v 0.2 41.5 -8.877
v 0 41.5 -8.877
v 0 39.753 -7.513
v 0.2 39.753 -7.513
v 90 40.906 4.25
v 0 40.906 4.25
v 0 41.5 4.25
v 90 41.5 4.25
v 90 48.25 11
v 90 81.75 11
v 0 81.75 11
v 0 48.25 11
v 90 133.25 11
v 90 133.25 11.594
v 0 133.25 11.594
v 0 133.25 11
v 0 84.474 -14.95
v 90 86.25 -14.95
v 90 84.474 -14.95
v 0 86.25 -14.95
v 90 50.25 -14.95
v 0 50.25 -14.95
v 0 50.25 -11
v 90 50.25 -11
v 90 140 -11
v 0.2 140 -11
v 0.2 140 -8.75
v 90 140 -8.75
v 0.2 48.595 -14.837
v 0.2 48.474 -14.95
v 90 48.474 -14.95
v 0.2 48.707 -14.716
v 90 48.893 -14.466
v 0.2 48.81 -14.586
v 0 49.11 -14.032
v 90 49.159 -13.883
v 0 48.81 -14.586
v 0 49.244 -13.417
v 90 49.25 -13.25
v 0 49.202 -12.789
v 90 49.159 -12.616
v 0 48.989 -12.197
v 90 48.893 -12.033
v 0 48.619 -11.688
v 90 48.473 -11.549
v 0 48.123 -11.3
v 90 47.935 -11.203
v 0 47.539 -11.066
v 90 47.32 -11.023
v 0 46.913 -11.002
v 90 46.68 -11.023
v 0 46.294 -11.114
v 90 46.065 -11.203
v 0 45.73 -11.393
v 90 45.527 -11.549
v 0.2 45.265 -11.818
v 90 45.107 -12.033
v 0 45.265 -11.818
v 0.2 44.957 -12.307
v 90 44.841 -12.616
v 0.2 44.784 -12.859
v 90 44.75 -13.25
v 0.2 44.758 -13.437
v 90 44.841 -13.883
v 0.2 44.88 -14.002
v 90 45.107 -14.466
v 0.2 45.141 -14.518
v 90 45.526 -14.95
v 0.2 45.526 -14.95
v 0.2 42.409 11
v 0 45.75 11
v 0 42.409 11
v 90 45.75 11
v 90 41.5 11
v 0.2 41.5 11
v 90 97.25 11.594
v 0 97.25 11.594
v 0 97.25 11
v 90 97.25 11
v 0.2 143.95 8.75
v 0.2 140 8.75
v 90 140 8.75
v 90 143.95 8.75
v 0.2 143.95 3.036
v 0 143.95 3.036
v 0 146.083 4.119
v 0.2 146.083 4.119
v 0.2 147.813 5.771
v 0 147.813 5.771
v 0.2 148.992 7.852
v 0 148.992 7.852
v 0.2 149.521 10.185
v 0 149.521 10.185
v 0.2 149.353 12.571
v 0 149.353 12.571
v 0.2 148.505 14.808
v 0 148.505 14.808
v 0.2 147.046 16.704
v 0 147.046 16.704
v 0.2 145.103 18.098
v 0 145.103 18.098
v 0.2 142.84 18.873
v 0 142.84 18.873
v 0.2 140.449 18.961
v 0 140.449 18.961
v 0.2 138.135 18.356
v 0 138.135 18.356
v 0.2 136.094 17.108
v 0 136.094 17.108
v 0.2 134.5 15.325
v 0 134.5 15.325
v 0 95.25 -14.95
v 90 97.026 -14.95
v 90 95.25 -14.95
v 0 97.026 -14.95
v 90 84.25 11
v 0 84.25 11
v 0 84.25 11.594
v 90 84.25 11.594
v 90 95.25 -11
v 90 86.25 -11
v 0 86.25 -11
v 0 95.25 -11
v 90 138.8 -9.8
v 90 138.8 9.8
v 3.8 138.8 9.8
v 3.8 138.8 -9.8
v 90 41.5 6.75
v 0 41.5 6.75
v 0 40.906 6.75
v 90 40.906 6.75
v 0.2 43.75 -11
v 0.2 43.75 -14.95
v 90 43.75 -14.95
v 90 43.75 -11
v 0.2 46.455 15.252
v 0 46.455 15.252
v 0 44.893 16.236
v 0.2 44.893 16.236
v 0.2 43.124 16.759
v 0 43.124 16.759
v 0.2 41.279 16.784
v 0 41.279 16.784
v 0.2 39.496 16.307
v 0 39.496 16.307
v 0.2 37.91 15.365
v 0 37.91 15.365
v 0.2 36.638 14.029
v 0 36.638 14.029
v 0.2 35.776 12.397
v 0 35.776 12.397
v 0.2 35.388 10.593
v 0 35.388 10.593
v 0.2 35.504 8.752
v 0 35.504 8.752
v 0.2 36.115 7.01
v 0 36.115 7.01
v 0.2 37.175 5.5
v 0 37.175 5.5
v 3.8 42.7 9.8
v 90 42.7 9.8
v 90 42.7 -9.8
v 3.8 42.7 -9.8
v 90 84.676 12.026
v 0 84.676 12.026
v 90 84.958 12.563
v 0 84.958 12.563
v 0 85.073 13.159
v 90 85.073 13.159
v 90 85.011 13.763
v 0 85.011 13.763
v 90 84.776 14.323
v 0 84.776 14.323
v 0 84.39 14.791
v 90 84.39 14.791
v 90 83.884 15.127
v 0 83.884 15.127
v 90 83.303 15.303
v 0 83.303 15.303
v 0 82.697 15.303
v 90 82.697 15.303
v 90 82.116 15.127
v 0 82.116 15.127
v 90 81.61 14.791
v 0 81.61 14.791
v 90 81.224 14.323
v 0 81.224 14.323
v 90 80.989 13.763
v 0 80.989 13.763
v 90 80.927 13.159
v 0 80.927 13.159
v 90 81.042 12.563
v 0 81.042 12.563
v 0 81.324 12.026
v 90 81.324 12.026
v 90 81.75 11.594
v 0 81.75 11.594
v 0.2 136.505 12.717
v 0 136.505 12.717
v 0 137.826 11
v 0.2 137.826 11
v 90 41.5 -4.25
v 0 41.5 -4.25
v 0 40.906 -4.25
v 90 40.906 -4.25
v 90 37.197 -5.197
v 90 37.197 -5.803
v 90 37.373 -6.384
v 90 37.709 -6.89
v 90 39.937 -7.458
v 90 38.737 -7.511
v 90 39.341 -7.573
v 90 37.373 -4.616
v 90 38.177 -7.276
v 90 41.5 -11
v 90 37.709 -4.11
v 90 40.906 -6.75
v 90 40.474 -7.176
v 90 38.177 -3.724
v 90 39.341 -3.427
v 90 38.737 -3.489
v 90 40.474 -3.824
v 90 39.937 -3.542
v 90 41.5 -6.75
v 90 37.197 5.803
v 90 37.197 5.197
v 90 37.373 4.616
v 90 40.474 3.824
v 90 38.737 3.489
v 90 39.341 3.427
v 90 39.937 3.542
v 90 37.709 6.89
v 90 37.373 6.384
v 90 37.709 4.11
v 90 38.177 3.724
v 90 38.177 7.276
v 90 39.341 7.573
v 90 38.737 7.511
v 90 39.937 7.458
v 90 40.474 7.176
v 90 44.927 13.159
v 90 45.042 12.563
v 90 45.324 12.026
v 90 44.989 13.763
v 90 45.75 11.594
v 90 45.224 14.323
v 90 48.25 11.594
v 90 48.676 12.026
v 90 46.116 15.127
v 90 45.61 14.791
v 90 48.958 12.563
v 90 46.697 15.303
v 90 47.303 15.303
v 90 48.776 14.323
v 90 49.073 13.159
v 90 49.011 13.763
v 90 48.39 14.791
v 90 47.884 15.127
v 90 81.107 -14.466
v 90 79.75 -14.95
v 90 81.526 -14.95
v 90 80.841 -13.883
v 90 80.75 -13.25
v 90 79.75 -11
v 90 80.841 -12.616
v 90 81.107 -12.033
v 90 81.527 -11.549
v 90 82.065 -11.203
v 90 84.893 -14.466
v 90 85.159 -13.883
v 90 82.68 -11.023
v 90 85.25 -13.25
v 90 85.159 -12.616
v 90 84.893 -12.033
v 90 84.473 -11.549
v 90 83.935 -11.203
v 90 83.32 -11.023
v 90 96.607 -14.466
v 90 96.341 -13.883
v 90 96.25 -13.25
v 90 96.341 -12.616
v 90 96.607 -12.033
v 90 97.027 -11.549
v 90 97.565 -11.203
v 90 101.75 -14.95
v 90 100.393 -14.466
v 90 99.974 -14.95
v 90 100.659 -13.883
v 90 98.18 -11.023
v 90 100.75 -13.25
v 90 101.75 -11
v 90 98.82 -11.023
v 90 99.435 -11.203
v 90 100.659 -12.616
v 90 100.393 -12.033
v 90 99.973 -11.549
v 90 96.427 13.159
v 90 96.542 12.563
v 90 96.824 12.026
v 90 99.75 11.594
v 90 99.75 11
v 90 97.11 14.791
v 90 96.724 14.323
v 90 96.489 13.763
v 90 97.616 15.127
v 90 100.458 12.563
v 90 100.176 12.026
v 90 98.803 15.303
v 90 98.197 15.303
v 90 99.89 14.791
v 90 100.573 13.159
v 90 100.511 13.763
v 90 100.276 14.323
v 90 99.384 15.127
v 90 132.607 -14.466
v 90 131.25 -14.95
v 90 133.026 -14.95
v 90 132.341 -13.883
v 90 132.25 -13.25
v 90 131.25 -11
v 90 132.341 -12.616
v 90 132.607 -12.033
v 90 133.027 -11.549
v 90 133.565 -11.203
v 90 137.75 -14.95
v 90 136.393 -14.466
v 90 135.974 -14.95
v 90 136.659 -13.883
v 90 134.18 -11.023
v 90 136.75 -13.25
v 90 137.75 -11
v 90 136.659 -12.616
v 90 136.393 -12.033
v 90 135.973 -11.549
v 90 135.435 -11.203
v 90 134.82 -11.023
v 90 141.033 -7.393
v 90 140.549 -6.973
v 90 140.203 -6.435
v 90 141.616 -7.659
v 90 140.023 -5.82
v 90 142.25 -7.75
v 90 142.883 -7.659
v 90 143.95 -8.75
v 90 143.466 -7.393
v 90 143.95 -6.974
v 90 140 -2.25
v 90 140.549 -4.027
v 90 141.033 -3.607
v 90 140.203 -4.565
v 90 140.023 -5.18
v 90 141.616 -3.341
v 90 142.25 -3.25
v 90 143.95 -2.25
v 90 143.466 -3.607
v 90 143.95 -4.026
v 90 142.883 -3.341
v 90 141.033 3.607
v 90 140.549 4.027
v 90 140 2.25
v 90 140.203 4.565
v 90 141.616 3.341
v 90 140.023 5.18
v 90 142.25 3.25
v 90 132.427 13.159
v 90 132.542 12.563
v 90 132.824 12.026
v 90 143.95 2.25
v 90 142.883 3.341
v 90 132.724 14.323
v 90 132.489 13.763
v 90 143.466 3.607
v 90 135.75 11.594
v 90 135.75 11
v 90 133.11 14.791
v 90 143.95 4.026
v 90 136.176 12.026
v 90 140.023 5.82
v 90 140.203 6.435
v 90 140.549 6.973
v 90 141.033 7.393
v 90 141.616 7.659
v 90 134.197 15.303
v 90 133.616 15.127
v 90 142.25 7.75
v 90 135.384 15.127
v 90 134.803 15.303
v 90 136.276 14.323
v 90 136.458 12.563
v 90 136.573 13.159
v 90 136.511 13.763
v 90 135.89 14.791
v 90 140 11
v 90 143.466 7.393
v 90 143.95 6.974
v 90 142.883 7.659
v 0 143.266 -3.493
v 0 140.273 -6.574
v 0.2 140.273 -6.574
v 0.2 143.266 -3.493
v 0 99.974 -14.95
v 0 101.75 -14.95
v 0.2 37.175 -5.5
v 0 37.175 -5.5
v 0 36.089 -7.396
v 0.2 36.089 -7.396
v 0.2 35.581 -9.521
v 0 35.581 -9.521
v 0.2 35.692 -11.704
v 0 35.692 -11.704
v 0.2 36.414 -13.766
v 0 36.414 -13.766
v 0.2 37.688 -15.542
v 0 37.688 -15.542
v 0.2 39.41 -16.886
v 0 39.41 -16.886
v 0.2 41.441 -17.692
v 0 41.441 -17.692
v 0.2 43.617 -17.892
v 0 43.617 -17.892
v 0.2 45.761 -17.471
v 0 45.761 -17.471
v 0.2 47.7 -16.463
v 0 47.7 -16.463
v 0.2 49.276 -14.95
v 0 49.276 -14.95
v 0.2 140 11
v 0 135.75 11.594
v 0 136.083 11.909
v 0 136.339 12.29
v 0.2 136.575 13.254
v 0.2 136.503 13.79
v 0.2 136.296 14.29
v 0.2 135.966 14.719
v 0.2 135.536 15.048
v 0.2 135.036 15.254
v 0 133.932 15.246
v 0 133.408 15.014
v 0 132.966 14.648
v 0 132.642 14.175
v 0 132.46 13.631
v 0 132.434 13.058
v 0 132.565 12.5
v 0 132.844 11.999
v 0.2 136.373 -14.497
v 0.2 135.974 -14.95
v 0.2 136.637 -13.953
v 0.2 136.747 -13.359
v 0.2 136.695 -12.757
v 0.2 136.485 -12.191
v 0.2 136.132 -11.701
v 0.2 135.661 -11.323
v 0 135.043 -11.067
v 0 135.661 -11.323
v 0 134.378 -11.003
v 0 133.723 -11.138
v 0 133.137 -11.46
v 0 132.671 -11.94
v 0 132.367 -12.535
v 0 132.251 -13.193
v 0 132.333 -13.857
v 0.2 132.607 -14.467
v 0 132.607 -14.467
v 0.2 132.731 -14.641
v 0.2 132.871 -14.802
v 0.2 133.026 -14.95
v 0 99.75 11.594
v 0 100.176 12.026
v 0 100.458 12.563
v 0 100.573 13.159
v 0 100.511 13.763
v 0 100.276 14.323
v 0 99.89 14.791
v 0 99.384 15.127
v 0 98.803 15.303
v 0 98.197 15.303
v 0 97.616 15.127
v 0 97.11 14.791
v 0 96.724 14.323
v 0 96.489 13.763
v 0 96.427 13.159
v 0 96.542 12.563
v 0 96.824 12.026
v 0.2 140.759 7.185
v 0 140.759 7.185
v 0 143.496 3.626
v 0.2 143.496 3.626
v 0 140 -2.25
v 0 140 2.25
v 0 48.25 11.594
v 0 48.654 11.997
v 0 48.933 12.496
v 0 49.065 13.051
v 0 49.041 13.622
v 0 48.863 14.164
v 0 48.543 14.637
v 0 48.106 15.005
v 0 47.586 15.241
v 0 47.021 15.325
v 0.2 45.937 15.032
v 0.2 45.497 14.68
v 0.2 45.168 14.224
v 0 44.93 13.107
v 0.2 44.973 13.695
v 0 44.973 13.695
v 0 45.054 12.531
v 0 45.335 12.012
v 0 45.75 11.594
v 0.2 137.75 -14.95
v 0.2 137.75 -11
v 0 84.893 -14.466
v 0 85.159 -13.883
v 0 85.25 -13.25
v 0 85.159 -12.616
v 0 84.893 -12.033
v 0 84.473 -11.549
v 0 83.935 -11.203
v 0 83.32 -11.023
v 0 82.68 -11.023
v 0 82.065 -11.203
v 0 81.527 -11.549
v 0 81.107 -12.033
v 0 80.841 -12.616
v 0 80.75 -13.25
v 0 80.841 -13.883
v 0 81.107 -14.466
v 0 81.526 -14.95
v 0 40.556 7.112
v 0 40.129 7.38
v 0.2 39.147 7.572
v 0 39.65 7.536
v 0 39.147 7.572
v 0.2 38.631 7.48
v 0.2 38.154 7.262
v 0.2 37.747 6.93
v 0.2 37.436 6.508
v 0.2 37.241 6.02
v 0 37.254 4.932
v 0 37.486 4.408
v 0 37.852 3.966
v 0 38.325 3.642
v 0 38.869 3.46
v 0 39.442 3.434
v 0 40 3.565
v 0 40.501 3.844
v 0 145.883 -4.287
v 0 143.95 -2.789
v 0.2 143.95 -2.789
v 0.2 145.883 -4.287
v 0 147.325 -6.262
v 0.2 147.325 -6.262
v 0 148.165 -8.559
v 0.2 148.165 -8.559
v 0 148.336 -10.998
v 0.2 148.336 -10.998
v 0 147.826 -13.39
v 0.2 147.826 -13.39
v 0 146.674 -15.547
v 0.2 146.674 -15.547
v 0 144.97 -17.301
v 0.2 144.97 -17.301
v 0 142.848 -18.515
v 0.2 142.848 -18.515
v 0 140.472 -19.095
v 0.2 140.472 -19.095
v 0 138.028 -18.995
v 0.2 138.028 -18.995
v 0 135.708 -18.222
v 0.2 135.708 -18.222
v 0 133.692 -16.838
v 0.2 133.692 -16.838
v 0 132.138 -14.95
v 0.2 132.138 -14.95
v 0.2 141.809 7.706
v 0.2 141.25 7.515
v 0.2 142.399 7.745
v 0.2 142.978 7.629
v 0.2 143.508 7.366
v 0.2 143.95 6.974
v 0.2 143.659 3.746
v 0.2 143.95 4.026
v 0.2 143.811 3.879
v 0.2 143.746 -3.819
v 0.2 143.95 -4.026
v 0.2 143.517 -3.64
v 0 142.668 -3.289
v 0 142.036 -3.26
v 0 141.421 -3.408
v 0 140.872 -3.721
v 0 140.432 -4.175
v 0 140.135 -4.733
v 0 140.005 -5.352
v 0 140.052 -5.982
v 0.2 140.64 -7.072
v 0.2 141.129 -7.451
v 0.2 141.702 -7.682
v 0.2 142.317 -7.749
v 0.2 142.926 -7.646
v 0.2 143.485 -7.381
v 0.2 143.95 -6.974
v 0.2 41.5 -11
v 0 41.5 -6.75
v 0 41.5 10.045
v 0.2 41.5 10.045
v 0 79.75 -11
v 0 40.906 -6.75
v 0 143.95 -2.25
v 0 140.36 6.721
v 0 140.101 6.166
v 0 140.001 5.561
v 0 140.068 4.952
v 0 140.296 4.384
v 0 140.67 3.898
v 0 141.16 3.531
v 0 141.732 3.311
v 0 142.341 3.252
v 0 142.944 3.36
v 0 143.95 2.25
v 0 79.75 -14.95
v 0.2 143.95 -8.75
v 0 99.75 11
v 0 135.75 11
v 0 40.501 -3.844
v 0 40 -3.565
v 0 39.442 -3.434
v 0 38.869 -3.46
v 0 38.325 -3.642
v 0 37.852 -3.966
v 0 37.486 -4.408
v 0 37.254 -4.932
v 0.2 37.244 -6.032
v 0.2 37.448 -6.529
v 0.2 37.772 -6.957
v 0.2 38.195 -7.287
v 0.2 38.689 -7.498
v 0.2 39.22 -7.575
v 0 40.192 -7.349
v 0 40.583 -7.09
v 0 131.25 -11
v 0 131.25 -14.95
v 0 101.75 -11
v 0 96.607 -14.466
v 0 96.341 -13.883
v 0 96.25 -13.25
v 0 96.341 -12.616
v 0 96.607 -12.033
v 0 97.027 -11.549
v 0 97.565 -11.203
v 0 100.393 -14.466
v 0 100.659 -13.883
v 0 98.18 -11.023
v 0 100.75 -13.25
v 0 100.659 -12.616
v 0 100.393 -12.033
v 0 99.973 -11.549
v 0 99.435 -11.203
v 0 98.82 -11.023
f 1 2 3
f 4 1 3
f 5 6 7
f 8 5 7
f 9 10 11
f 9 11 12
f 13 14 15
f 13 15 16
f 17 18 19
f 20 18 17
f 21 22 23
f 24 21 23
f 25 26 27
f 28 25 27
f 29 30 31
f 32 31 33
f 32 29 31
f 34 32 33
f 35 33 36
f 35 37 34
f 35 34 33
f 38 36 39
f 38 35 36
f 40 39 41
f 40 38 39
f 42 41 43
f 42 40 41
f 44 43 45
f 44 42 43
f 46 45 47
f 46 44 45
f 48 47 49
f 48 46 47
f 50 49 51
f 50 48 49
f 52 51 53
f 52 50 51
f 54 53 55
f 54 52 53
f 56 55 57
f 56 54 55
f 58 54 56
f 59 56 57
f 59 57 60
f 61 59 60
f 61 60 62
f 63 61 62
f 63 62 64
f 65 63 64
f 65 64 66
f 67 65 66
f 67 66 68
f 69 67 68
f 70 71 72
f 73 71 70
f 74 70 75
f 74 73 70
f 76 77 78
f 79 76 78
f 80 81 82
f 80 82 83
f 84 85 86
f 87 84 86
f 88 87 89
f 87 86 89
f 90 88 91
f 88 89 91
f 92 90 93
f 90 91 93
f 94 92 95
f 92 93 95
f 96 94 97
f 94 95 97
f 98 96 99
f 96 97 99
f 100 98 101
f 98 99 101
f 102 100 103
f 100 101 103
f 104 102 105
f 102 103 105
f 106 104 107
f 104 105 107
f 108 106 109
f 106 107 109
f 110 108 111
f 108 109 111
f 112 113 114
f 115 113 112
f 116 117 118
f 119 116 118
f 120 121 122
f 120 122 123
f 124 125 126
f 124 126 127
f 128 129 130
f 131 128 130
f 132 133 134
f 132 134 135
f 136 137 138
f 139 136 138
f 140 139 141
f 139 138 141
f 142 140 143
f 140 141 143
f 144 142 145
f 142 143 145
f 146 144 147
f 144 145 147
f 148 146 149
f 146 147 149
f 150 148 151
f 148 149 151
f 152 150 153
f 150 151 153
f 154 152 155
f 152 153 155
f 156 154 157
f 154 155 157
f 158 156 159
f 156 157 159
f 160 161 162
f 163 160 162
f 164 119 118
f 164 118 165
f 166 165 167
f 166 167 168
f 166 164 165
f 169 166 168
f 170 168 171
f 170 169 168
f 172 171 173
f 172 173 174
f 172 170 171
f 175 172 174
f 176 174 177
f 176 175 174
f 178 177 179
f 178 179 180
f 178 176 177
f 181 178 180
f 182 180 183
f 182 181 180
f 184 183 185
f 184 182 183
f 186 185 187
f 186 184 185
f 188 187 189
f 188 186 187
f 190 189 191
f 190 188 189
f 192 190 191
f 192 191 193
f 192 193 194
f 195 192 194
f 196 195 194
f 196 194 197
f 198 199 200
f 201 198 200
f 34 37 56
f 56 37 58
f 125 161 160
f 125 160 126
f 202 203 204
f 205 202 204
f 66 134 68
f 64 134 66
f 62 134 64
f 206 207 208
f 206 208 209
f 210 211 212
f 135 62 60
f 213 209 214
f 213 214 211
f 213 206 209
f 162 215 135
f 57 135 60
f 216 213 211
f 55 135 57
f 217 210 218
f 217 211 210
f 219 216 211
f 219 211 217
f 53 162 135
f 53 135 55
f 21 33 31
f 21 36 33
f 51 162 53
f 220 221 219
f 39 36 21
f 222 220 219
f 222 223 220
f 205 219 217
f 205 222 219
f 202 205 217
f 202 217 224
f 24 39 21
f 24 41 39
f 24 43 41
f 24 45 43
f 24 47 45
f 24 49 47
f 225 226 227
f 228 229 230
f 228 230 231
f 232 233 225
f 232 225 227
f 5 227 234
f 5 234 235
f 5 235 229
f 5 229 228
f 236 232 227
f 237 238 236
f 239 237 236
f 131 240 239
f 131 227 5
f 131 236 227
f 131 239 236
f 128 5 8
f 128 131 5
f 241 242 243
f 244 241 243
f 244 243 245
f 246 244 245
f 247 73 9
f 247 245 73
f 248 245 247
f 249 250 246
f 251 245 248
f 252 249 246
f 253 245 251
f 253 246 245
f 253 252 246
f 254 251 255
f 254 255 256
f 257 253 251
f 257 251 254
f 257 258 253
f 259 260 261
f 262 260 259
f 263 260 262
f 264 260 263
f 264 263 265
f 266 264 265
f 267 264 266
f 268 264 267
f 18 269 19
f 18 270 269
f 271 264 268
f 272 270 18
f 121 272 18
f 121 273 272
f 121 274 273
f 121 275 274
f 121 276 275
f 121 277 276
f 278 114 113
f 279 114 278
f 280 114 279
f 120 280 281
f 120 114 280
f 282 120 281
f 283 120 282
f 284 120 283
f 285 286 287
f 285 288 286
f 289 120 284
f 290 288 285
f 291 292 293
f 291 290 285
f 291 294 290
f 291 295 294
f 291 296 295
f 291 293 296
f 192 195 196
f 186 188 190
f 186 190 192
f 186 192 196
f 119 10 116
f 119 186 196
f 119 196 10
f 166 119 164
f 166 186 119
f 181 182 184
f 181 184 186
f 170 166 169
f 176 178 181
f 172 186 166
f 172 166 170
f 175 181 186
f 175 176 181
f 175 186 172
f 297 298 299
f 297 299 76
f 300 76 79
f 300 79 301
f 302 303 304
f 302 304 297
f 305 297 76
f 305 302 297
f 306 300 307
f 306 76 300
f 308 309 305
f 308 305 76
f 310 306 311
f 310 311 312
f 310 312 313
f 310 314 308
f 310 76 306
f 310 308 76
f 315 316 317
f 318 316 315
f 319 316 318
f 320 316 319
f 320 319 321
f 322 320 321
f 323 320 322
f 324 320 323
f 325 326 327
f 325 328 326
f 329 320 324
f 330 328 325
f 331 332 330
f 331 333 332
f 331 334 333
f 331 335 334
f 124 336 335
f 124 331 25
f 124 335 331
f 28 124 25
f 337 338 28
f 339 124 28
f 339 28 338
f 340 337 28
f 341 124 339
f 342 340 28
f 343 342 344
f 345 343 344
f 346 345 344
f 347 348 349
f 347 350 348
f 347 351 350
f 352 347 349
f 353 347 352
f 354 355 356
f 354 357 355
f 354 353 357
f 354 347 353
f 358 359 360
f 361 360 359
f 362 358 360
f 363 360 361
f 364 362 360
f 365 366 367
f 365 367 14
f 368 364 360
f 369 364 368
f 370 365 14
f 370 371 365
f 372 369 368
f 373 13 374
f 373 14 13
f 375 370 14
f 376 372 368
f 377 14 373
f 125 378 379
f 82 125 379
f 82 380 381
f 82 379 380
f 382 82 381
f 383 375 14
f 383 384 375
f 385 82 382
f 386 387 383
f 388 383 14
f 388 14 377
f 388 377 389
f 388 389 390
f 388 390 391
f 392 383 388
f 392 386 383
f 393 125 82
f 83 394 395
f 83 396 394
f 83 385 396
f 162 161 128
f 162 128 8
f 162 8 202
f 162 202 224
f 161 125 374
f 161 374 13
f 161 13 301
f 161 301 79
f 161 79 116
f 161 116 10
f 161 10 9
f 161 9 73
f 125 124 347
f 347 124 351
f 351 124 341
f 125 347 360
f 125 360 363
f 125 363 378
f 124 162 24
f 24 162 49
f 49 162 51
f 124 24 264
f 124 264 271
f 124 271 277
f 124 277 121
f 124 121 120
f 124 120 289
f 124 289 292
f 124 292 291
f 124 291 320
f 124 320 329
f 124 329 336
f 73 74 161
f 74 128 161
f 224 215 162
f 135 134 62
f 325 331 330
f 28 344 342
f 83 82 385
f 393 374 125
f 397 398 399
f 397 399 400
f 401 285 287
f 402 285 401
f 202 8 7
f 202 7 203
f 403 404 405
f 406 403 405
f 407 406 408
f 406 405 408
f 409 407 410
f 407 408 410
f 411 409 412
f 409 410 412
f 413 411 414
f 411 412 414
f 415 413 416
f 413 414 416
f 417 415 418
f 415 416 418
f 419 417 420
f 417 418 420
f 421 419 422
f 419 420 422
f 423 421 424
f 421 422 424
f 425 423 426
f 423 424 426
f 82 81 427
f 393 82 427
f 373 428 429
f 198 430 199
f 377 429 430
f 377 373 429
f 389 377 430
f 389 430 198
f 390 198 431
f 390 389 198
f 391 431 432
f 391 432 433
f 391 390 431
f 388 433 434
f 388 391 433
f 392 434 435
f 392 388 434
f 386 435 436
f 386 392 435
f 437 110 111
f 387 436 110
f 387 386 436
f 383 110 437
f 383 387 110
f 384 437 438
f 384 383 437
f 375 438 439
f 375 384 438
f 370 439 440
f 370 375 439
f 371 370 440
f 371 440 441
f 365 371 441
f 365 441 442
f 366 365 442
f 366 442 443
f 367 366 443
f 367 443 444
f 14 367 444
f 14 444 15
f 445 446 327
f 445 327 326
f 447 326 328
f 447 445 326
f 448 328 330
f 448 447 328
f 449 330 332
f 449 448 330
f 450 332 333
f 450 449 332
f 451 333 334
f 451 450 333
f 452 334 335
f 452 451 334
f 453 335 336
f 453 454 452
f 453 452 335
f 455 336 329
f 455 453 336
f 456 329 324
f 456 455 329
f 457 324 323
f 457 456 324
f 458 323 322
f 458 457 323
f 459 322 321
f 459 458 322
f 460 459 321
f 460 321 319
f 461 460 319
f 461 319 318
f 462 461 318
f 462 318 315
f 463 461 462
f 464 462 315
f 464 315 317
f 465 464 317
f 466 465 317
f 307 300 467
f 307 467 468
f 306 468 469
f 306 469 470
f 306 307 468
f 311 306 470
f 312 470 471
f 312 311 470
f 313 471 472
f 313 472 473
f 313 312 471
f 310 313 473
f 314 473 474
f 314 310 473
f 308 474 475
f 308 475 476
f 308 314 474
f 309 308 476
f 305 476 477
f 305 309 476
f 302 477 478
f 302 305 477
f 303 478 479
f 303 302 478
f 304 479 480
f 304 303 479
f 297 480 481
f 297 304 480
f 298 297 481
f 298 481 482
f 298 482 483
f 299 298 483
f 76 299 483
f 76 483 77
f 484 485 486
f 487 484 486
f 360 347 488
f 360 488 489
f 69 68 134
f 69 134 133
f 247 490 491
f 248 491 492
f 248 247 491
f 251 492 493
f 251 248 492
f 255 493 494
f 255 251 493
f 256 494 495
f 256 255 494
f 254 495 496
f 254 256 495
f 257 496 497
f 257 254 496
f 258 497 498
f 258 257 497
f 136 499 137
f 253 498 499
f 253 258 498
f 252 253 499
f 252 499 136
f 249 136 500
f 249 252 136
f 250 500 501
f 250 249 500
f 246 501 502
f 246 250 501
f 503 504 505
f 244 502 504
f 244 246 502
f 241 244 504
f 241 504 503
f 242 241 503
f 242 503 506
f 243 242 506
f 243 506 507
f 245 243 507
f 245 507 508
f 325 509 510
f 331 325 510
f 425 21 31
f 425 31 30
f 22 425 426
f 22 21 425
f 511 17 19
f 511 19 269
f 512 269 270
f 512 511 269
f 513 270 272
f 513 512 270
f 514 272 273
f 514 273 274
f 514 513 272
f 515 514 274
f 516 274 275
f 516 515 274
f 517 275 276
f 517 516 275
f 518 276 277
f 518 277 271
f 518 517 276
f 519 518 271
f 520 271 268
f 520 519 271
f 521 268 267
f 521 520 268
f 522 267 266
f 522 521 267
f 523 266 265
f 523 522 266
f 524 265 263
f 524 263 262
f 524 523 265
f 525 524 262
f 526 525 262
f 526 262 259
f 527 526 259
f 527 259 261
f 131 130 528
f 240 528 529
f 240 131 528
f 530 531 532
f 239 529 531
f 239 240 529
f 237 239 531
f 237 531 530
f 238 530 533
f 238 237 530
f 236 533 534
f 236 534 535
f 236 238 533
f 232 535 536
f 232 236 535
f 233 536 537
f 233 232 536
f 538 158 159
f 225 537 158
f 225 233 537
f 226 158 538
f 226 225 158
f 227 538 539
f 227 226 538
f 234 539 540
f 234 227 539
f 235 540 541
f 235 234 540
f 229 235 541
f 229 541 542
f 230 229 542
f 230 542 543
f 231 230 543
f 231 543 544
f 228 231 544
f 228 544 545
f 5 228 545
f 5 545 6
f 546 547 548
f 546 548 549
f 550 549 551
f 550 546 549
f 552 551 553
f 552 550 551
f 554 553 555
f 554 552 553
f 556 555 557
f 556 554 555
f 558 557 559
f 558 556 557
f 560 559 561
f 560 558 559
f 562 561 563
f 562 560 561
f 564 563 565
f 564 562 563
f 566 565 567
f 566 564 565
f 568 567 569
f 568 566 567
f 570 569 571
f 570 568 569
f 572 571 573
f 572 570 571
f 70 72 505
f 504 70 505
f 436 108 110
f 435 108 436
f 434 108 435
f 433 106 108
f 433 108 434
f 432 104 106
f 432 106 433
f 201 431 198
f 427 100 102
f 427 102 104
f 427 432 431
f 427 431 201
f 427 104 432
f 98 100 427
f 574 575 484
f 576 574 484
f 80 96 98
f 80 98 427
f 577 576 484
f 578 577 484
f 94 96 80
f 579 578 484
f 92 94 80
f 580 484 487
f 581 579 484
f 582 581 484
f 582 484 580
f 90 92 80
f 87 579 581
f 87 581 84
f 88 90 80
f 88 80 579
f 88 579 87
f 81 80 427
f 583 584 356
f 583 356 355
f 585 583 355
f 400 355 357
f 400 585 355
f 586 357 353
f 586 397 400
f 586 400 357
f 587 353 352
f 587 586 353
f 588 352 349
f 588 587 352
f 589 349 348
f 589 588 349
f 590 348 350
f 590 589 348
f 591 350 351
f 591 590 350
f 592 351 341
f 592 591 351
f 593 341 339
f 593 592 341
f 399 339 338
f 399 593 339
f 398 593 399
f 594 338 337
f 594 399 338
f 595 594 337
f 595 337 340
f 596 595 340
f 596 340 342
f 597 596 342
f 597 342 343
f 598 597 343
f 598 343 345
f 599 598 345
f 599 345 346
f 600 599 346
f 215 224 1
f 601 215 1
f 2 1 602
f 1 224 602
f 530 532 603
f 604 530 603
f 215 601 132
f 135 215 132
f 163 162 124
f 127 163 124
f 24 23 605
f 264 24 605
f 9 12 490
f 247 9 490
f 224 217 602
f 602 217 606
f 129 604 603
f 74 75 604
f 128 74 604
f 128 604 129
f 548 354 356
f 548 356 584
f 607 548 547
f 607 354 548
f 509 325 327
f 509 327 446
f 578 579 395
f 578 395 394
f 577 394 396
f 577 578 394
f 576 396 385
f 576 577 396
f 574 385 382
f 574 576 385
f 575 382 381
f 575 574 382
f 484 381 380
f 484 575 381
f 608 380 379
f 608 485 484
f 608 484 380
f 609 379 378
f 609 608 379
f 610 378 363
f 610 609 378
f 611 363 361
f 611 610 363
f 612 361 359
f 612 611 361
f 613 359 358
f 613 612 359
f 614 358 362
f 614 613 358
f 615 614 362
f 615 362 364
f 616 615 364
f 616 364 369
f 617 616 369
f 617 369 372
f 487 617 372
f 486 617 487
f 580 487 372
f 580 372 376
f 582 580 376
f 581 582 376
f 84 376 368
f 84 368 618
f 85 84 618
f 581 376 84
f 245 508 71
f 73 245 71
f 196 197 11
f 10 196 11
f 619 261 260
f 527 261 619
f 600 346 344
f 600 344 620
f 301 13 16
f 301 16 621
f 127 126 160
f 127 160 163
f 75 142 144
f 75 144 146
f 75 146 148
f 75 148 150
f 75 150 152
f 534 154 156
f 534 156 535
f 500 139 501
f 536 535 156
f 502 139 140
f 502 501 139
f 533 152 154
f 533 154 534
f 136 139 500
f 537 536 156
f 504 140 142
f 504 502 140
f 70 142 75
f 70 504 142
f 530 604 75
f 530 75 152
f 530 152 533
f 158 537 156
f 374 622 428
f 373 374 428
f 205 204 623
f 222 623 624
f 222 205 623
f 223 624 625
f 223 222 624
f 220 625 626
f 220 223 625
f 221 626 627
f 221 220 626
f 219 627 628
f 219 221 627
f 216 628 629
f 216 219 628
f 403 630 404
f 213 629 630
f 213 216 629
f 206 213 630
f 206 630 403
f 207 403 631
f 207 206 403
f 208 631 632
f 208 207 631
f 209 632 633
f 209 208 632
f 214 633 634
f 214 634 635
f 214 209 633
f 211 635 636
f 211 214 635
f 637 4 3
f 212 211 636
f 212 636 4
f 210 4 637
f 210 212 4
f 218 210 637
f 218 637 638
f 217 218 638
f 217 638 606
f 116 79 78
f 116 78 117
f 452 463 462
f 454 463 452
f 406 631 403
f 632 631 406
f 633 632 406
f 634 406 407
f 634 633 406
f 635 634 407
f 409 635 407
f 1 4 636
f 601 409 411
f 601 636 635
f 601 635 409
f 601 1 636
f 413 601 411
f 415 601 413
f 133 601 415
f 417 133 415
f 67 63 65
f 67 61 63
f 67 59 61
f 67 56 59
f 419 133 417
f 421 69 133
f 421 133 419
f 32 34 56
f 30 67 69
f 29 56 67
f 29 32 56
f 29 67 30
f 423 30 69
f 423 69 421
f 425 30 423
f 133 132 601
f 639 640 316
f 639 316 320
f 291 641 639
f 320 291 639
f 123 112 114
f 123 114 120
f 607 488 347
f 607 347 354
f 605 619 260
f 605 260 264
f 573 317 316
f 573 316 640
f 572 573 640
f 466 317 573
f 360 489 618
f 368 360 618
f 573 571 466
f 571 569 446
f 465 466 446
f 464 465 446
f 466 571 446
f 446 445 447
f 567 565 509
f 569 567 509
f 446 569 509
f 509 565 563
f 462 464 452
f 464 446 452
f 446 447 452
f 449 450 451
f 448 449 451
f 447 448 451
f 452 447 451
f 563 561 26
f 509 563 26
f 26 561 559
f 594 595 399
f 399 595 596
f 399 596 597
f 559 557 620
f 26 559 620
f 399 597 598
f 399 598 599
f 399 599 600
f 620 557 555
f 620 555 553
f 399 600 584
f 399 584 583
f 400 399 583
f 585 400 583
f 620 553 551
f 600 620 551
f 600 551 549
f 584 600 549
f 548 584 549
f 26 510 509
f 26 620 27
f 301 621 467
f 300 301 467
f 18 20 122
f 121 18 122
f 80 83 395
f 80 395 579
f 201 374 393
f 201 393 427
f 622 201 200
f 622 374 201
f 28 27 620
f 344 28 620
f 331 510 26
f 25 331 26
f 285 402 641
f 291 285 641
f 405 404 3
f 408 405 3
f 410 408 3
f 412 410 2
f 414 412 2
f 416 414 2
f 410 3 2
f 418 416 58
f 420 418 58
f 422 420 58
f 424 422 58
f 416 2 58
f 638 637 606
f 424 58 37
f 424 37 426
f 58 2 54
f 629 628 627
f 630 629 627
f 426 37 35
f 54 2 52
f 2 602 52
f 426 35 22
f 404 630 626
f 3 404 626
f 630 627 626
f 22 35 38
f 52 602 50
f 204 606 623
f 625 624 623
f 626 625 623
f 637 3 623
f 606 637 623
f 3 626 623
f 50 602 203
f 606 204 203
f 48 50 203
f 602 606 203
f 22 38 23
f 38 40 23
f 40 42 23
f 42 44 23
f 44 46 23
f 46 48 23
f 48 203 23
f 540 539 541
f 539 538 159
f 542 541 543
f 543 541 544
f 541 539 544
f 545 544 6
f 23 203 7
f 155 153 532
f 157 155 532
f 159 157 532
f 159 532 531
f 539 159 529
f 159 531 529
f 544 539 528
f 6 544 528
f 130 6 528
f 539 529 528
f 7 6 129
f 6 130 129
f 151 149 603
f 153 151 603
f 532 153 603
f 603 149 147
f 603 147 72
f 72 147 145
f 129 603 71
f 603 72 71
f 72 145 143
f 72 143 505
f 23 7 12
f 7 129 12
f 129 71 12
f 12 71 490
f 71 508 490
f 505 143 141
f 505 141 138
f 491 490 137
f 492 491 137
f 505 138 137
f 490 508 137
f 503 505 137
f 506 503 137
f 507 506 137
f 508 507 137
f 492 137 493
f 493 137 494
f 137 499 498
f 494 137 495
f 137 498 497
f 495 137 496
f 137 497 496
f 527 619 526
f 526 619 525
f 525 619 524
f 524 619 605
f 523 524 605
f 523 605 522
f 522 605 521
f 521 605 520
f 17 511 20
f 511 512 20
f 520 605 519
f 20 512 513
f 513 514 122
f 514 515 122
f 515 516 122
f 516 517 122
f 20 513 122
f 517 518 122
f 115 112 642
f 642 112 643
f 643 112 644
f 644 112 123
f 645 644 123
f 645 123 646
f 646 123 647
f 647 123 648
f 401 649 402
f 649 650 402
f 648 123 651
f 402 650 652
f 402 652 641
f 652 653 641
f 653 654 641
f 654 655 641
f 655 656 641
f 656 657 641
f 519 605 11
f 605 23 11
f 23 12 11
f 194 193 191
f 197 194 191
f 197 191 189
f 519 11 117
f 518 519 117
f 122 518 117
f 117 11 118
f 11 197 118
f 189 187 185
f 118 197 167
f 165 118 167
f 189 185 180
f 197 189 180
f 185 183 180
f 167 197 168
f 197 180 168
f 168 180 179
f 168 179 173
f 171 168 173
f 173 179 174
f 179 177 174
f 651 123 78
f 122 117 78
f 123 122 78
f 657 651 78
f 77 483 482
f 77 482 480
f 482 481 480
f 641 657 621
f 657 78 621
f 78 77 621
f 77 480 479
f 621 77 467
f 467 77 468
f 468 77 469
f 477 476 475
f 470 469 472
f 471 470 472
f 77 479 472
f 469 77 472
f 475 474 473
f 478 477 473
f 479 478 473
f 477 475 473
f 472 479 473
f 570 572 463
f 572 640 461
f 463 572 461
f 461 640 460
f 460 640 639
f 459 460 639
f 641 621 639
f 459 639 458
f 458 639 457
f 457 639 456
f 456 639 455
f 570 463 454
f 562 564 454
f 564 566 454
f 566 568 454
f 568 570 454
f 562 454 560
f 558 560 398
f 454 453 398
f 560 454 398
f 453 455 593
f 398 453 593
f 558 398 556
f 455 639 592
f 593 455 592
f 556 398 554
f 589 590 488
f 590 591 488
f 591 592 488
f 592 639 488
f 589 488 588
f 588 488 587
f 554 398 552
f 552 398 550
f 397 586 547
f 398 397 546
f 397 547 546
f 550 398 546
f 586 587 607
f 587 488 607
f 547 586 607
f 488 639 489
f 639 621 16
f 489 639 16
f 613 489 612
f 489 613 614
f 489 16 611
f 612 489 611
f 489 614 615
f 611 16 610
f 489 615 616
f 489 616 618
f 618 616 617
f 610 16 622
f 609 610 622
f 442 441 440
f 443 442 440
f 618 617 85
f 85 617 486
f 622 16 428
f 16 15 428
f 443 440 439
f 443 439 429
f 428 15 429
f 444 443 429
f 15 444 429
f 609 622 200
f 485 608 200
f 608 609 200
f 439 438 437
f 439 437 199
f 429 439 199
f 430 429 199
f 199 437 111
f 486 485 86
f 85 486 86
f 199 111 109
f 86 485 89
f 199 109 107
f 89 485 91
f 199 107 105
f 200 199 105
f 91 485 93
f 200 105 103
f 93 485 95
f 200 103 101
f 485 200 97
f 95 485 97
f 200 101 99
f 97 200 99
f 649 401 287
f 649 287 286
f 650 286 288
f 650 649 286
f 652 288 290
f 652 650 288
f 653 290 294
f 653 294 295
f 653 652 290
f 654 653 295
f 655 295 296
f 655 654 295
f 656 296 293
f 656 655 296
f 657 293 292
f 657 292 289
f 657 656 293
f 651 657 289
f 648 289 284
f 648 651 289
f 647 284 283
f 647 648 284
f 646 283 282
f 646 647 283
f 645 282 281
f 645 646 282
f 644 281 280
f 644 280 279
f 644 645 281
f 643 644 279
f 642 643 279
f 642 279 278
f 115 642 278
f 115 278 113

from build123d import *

# Parameters (mm, degrees)
EXTRUDE_1_DEPTH     = 90
SKETCH_2_W          = 90
SKETCH_2_H          = 17.75
EXTRUDE_2_DEPTH     = 8.2
SKETCH_3_W          = 90
SKETCH_3_H          = 102.45
EXTRUDE_3_DEPTH     = 8.2
SKETCH_4_W          = 3.95
SKETCH_4_H          = 2.25
CUT_EXTRUDE_1_DEPTH = 171.45954982
SKETCH_5_W          = 3.95
SKETCH_5_H          = 29.5
CUT_EXTRUDE_2_DEPTH = 171.45954982
SKETCH_6_W          = 3.95
SKETCH_6_H          = 9
CUT_EXTRUDE_3_DEPTH = 171.45954982
SKETCH_7_W          = 3.95
SKETCH_7_H          = 29.5
CUT_EXTRUDE_4_DEPTH = 171.45954982
SKETCH_8_W          = 3.95
SKETCH_8_H          = 6.2
CUT_EXTRUDE_5_DEPTH = 171.45954982
SKETCH_9_W          = 2.25
SKETCH_9_H          = 3.95
CUT_EXTRUDE_6_DEPTH = 171.45954982
SKETCH_10_W         = 4.5
SKETCH_10_H         = 3.95
CUT_EXTRUDE_7_DEPTH = 171.45954982
SKETCH_11_W         = 2.25
SKETCH_11_H         = 3.95
CUT_EXTRUDE_8_DEPTH = 171.45954982
SKETCH_12_W         = 19.6
SKETCH_12_H         = 96.1
CUT_EXTRUDE_9_DEPTH = 86.2
EXTRUDE_START       = -90
EXTRUDE_5_DEPTH     = 90
EXTRUDE_6_DEPTH     = 0.2


# Read off the part's stored shape, not the designer's step: Бобышка-Вытянуть5
with BuildPart() as part:
    # Эскиз1 → Бобышка-Вытянуть1 (new body)
    with BuildSketch(Plane(origin=(90, 0, 0), x_dir=(0, 0, -1), z_dir=(1, 0, 0))):
        with BuildLine():
            Line((6.75, 40.906238208), (6.75, 135.75))
            Line((6.75, 135.75), (-11.593761792, 135.75))
            ThreePointArc((-11.593761792, 135.75), (-15.325, 134.5), (-11.593761793, 133.25))
            Line((-11.593761793, 133.25), (-11, 133.25))
            Line((-11, 133.25), (-11, 99.75))
            Line((-11, 99.75), (-11.593761792, 99.75))
            ThreePointArc((-11.593761792, 99.75), (-15.325, 98.5), (-11.593761792, 97.25))
            Line((-11.593761792, 97.25), (-11, 97.25))
            Line((-11, 97.25), (-11, 84.25))
            Line((-11, 84.25), (-11.593761792, 84.25))
            ThreePointArc((-11.593761792, 84.25), (-15.325, 83), (-11.593761792, 81.75))
            Line((-11.593761792, 81.75), (-11, 81.75))
            Line((-11, 81.75), (-11, 48.25))
            Line((-11, 48.25), (-11.593761792, 48.25))
            ThreePointArc((-11.593761792, 48.25), (-15.325, 47), (-11.593761792, 45.75))
            Line((-11.593761792, 45.75), (-11, 45.75))
            Line((-11, 45.75), (-11, 41.5))
            Line((-11, 41.5), (-6.75, 41.5))
            Line((-6.75, 41.5), (-6.75, 40.906238208))
            ThreePointArc((-6.75, 40.906238208), (-5.5, 37.175), (-4.25, 40.906238208))
            Line((-4.25, 40.906238208), (-4.25, 41.5))
            Line((-4.25, 41.5), (4.25, 41.5))
            Line((4.25, 41.5), (4.25, 40.906238208))
            ThreePointArc((4.25, 40.906238208), (5.5, 37.175), (6.75, 40.906238208))
        make_face()
    extrude(amount=-EXTRUDE_1_DEPTH)

    # Эскиз2 → Бобышка-Вытянуть2 (add)
    with BuildSketch(Plane(origin=(0, 135.75, 0), x_dir=(-1, 0, 0), z_dir=(0, 1, 0))):
        with Locations((-45, 2.125)):
            Rectangle(SKETCH_2_W, SKETCH_2_H)
    extrude(amount=EXTRUDE_2_DEPTH)

    # Эскиз3 → Бобышка-Вытянуть3 (add)
    with BuildSketch(Plane(origin=(0, 0, -6.75), x_dir=(-1, 0, 0), z_dir=(0, 0, -1))):
        with Locations((-45, 92.725)):
            Rectangle(SKETCH_3_W, SKETCH_3_H)
    extrude(amount=EXTRUDE_3_DEPTH)

    # Эскиз4 → Вырез-Вытянуть1 (cut, through all)
    with BuildSketch(Plane.ZY):
        with Locations((-12.975, 42.625)):
            Rectangle(SKETCH_4_W, SKETCH_4_H)
    extrude(amount=-CUT_EXTRUDE_1_DEPTH, mode=Mode.SUBTRACT)

    # Эскиз5 → Вырез-Вытянуть2 (cut, through all)
    with BuildSketch(Plane.ZY):
        with Locations((-12.975, 65)):
            Rectangle(SKETCH_5_W, SKETCH_5_H)
    extrude(amount=-CUT_EXTRUDE_2_DEPTH, mode=Mode.SUBTRACT)

    # Эскиз6 → Вырез-Вытянуть3 (cut, through all)
    with BuildSketch(Plane.ZY):
        with Locations((-12.975, 90.75)):
            Rectangle(SKETCH_6_W, SKETCH_6_H)
    extrude(amount=-CUT_EXTRUDE_3_DEPTH, mode=Mode.SUBTRACT)

    # Эскиз7 → Вырез-Вытянуть4 (cut, through all)
    with BuildSketch(Plane.ZY):
        with Locations((-12.975, 116.5)):
            Rectangle(SKETCH_7_W, SKETCH_7_H)
    extrude(amount=-CUT_EXTRUDE_4_DEPTH, mode=Mode.SUBTRACT)

    # Эскиз8 → Вырез-Вытянуть5 (cut, through all)
    with BuildSketch(Plane.ZY):
        with Locations((-12.975, 140.85)):
            Rectangle(SKETCH_8_W, SKETCH_8_H)
    extrude(amount=-CUT_EXTRUDE_5_DEPTH, mode=Mode.SUBTRACT)

    # Эскиз9 → Вырез-Вытянуть6 (cut, through all)
    with BuildSketch(Plane.ZY):
        with Locations((-9.875, 141.975)):
            Rectangle(SKETCH_9_W, SKETCH_9_H)
    extrude(amount=-CUT_EXTRUDE_6_DEPTH, mode=Mode.SUBTRACT)

    # Эскиз10 → Вырез-Вытянуть7 (cut, through all)
    with BuildSketch(Plane.ZY):
        with Locations((0, 141.975)):
            Rectangle(SKETCH_10_W, SKETCH_10_H)
    extrude(amount=-CUT_EXTRUDE_7_DEPTH, mode=Mode.SUBTRACT)

    # Эскиз11 → Вырез-Вытянуть8 (cut, through all)
    with BuildSketch(Plane.ZY):
        with Locations((9.875, 141.975)):
            Rectangle(SKETCH_11_W, SKETCH_11_H)
    extrude(amount=-CUT_EXTRUDE_8_DEPTH, mode=Mode.SUBTRACT)

    # Эскиз12 → Вырез-Вытянуть9 (cut)
    with BuildSketch(Plane(origin=(90, 0, 0), x_dir=(0, 0, -1), z_dir=(1, 0, 0))):
        with Locations((0, 90.75)):
            Rectangle(SKETCH_12_W, SKETCH_12_H)
    extrude(amount=-CUT_EXTRUDE_9_DEPTH, mode=Mode.SUBTRACT)

    # Бобышка-Вытянуть5 outline → Бобышка-Вытянуть5 (cut)
    with BuildSketch(Plane(origin=(90, 0, 0), x_dir=(0, 0, -1), z_dir=(1, 0, 0)).offset(EXTRUDE_START)):
        with BuildLine():
            ThreePointArc((-6.973940297, 143.95), (-5.5, 140), (-4.026059703, 143.95))
            Line((-4.026059703, 143.95), (-6.973940297, 143.95))
        make_face()
        with BuildLine():
            ThreePointArc((4.026059703, 143.95), (5.5, 140), (6.973940297, 143.95))
            Line((6.973940297, 143.95), (4.026059703, 143.95))
        make_face()
        with BuildLine():
            ThreePointArc((14.95, 135.973940297), (11, 134.5), (14.95, 133.026059703))
            Line((14.95, 133.026059703), (14.95, 135.973940297))
        make_face()
        with BuildLine():
            ThreePointArc((14.95, 99.973940297), (11, 98.5), (14.95, 97.026059703))
            Line((14.95, 97.026059703), (14.95, 99.973940297))
        make_face()
        with BuildLine():
            ThreePointArc((14.95, 84.473940297), (11, 83), (14.95, 81.526059703))
            Line((14.95, 81.526059703), (14.95, 84.473940297))
        make_face()
        with BuildLine():
            ThreePointArc((14.95, 48.473940297), (11, 47), (14.95, 45.526059703))
            Line((14.95, 45.526059703), (14.95, 48.473940297))
        make_face()
    extrude(amount=EXTRUDE_5_DEPTH, mode=Mode.SUBTRACT)

    # Эскиз21 → Бобышка-Вытянуть6 (add)
    with BuildSketch(Plane.ZY):
        with BuildLine():
            Line((-14.95, 49.276213414), (-5.5, 37.175))
            ThreePointArc((-5.5, 37.175), (-16.275606707, 38.500606707), (-14.95, 49.276213414))
        make_face()
        with BuildLine():
            Line((5.5, 37.175), (15.252051369, 46.45464203))
            ThreePointArc((15.252051369, 46.45464203), (14.740776792, 37.227868536), (5.5, 37.175))
        make_face()
        with BuildLine():
            Line((-14.95, 132.138029851), (-2.788562926, 143.95))
            ThreePointArc((-2.788562926, 143.95), (-16.483808441, 145.883823994), (-14.95, 132.138029851))
        make_face()
        with BuildLine():
            Line((15.325, 134.5), (3.036005332, 143.95))
            ThreePointArc((3.036005332, 143.95), (15.809128056, 147.845015034), (15.325, 134.5))
        make_face()
    extrude(amount=-EXTRUDE_6_DEPTH)


solid = part.part
